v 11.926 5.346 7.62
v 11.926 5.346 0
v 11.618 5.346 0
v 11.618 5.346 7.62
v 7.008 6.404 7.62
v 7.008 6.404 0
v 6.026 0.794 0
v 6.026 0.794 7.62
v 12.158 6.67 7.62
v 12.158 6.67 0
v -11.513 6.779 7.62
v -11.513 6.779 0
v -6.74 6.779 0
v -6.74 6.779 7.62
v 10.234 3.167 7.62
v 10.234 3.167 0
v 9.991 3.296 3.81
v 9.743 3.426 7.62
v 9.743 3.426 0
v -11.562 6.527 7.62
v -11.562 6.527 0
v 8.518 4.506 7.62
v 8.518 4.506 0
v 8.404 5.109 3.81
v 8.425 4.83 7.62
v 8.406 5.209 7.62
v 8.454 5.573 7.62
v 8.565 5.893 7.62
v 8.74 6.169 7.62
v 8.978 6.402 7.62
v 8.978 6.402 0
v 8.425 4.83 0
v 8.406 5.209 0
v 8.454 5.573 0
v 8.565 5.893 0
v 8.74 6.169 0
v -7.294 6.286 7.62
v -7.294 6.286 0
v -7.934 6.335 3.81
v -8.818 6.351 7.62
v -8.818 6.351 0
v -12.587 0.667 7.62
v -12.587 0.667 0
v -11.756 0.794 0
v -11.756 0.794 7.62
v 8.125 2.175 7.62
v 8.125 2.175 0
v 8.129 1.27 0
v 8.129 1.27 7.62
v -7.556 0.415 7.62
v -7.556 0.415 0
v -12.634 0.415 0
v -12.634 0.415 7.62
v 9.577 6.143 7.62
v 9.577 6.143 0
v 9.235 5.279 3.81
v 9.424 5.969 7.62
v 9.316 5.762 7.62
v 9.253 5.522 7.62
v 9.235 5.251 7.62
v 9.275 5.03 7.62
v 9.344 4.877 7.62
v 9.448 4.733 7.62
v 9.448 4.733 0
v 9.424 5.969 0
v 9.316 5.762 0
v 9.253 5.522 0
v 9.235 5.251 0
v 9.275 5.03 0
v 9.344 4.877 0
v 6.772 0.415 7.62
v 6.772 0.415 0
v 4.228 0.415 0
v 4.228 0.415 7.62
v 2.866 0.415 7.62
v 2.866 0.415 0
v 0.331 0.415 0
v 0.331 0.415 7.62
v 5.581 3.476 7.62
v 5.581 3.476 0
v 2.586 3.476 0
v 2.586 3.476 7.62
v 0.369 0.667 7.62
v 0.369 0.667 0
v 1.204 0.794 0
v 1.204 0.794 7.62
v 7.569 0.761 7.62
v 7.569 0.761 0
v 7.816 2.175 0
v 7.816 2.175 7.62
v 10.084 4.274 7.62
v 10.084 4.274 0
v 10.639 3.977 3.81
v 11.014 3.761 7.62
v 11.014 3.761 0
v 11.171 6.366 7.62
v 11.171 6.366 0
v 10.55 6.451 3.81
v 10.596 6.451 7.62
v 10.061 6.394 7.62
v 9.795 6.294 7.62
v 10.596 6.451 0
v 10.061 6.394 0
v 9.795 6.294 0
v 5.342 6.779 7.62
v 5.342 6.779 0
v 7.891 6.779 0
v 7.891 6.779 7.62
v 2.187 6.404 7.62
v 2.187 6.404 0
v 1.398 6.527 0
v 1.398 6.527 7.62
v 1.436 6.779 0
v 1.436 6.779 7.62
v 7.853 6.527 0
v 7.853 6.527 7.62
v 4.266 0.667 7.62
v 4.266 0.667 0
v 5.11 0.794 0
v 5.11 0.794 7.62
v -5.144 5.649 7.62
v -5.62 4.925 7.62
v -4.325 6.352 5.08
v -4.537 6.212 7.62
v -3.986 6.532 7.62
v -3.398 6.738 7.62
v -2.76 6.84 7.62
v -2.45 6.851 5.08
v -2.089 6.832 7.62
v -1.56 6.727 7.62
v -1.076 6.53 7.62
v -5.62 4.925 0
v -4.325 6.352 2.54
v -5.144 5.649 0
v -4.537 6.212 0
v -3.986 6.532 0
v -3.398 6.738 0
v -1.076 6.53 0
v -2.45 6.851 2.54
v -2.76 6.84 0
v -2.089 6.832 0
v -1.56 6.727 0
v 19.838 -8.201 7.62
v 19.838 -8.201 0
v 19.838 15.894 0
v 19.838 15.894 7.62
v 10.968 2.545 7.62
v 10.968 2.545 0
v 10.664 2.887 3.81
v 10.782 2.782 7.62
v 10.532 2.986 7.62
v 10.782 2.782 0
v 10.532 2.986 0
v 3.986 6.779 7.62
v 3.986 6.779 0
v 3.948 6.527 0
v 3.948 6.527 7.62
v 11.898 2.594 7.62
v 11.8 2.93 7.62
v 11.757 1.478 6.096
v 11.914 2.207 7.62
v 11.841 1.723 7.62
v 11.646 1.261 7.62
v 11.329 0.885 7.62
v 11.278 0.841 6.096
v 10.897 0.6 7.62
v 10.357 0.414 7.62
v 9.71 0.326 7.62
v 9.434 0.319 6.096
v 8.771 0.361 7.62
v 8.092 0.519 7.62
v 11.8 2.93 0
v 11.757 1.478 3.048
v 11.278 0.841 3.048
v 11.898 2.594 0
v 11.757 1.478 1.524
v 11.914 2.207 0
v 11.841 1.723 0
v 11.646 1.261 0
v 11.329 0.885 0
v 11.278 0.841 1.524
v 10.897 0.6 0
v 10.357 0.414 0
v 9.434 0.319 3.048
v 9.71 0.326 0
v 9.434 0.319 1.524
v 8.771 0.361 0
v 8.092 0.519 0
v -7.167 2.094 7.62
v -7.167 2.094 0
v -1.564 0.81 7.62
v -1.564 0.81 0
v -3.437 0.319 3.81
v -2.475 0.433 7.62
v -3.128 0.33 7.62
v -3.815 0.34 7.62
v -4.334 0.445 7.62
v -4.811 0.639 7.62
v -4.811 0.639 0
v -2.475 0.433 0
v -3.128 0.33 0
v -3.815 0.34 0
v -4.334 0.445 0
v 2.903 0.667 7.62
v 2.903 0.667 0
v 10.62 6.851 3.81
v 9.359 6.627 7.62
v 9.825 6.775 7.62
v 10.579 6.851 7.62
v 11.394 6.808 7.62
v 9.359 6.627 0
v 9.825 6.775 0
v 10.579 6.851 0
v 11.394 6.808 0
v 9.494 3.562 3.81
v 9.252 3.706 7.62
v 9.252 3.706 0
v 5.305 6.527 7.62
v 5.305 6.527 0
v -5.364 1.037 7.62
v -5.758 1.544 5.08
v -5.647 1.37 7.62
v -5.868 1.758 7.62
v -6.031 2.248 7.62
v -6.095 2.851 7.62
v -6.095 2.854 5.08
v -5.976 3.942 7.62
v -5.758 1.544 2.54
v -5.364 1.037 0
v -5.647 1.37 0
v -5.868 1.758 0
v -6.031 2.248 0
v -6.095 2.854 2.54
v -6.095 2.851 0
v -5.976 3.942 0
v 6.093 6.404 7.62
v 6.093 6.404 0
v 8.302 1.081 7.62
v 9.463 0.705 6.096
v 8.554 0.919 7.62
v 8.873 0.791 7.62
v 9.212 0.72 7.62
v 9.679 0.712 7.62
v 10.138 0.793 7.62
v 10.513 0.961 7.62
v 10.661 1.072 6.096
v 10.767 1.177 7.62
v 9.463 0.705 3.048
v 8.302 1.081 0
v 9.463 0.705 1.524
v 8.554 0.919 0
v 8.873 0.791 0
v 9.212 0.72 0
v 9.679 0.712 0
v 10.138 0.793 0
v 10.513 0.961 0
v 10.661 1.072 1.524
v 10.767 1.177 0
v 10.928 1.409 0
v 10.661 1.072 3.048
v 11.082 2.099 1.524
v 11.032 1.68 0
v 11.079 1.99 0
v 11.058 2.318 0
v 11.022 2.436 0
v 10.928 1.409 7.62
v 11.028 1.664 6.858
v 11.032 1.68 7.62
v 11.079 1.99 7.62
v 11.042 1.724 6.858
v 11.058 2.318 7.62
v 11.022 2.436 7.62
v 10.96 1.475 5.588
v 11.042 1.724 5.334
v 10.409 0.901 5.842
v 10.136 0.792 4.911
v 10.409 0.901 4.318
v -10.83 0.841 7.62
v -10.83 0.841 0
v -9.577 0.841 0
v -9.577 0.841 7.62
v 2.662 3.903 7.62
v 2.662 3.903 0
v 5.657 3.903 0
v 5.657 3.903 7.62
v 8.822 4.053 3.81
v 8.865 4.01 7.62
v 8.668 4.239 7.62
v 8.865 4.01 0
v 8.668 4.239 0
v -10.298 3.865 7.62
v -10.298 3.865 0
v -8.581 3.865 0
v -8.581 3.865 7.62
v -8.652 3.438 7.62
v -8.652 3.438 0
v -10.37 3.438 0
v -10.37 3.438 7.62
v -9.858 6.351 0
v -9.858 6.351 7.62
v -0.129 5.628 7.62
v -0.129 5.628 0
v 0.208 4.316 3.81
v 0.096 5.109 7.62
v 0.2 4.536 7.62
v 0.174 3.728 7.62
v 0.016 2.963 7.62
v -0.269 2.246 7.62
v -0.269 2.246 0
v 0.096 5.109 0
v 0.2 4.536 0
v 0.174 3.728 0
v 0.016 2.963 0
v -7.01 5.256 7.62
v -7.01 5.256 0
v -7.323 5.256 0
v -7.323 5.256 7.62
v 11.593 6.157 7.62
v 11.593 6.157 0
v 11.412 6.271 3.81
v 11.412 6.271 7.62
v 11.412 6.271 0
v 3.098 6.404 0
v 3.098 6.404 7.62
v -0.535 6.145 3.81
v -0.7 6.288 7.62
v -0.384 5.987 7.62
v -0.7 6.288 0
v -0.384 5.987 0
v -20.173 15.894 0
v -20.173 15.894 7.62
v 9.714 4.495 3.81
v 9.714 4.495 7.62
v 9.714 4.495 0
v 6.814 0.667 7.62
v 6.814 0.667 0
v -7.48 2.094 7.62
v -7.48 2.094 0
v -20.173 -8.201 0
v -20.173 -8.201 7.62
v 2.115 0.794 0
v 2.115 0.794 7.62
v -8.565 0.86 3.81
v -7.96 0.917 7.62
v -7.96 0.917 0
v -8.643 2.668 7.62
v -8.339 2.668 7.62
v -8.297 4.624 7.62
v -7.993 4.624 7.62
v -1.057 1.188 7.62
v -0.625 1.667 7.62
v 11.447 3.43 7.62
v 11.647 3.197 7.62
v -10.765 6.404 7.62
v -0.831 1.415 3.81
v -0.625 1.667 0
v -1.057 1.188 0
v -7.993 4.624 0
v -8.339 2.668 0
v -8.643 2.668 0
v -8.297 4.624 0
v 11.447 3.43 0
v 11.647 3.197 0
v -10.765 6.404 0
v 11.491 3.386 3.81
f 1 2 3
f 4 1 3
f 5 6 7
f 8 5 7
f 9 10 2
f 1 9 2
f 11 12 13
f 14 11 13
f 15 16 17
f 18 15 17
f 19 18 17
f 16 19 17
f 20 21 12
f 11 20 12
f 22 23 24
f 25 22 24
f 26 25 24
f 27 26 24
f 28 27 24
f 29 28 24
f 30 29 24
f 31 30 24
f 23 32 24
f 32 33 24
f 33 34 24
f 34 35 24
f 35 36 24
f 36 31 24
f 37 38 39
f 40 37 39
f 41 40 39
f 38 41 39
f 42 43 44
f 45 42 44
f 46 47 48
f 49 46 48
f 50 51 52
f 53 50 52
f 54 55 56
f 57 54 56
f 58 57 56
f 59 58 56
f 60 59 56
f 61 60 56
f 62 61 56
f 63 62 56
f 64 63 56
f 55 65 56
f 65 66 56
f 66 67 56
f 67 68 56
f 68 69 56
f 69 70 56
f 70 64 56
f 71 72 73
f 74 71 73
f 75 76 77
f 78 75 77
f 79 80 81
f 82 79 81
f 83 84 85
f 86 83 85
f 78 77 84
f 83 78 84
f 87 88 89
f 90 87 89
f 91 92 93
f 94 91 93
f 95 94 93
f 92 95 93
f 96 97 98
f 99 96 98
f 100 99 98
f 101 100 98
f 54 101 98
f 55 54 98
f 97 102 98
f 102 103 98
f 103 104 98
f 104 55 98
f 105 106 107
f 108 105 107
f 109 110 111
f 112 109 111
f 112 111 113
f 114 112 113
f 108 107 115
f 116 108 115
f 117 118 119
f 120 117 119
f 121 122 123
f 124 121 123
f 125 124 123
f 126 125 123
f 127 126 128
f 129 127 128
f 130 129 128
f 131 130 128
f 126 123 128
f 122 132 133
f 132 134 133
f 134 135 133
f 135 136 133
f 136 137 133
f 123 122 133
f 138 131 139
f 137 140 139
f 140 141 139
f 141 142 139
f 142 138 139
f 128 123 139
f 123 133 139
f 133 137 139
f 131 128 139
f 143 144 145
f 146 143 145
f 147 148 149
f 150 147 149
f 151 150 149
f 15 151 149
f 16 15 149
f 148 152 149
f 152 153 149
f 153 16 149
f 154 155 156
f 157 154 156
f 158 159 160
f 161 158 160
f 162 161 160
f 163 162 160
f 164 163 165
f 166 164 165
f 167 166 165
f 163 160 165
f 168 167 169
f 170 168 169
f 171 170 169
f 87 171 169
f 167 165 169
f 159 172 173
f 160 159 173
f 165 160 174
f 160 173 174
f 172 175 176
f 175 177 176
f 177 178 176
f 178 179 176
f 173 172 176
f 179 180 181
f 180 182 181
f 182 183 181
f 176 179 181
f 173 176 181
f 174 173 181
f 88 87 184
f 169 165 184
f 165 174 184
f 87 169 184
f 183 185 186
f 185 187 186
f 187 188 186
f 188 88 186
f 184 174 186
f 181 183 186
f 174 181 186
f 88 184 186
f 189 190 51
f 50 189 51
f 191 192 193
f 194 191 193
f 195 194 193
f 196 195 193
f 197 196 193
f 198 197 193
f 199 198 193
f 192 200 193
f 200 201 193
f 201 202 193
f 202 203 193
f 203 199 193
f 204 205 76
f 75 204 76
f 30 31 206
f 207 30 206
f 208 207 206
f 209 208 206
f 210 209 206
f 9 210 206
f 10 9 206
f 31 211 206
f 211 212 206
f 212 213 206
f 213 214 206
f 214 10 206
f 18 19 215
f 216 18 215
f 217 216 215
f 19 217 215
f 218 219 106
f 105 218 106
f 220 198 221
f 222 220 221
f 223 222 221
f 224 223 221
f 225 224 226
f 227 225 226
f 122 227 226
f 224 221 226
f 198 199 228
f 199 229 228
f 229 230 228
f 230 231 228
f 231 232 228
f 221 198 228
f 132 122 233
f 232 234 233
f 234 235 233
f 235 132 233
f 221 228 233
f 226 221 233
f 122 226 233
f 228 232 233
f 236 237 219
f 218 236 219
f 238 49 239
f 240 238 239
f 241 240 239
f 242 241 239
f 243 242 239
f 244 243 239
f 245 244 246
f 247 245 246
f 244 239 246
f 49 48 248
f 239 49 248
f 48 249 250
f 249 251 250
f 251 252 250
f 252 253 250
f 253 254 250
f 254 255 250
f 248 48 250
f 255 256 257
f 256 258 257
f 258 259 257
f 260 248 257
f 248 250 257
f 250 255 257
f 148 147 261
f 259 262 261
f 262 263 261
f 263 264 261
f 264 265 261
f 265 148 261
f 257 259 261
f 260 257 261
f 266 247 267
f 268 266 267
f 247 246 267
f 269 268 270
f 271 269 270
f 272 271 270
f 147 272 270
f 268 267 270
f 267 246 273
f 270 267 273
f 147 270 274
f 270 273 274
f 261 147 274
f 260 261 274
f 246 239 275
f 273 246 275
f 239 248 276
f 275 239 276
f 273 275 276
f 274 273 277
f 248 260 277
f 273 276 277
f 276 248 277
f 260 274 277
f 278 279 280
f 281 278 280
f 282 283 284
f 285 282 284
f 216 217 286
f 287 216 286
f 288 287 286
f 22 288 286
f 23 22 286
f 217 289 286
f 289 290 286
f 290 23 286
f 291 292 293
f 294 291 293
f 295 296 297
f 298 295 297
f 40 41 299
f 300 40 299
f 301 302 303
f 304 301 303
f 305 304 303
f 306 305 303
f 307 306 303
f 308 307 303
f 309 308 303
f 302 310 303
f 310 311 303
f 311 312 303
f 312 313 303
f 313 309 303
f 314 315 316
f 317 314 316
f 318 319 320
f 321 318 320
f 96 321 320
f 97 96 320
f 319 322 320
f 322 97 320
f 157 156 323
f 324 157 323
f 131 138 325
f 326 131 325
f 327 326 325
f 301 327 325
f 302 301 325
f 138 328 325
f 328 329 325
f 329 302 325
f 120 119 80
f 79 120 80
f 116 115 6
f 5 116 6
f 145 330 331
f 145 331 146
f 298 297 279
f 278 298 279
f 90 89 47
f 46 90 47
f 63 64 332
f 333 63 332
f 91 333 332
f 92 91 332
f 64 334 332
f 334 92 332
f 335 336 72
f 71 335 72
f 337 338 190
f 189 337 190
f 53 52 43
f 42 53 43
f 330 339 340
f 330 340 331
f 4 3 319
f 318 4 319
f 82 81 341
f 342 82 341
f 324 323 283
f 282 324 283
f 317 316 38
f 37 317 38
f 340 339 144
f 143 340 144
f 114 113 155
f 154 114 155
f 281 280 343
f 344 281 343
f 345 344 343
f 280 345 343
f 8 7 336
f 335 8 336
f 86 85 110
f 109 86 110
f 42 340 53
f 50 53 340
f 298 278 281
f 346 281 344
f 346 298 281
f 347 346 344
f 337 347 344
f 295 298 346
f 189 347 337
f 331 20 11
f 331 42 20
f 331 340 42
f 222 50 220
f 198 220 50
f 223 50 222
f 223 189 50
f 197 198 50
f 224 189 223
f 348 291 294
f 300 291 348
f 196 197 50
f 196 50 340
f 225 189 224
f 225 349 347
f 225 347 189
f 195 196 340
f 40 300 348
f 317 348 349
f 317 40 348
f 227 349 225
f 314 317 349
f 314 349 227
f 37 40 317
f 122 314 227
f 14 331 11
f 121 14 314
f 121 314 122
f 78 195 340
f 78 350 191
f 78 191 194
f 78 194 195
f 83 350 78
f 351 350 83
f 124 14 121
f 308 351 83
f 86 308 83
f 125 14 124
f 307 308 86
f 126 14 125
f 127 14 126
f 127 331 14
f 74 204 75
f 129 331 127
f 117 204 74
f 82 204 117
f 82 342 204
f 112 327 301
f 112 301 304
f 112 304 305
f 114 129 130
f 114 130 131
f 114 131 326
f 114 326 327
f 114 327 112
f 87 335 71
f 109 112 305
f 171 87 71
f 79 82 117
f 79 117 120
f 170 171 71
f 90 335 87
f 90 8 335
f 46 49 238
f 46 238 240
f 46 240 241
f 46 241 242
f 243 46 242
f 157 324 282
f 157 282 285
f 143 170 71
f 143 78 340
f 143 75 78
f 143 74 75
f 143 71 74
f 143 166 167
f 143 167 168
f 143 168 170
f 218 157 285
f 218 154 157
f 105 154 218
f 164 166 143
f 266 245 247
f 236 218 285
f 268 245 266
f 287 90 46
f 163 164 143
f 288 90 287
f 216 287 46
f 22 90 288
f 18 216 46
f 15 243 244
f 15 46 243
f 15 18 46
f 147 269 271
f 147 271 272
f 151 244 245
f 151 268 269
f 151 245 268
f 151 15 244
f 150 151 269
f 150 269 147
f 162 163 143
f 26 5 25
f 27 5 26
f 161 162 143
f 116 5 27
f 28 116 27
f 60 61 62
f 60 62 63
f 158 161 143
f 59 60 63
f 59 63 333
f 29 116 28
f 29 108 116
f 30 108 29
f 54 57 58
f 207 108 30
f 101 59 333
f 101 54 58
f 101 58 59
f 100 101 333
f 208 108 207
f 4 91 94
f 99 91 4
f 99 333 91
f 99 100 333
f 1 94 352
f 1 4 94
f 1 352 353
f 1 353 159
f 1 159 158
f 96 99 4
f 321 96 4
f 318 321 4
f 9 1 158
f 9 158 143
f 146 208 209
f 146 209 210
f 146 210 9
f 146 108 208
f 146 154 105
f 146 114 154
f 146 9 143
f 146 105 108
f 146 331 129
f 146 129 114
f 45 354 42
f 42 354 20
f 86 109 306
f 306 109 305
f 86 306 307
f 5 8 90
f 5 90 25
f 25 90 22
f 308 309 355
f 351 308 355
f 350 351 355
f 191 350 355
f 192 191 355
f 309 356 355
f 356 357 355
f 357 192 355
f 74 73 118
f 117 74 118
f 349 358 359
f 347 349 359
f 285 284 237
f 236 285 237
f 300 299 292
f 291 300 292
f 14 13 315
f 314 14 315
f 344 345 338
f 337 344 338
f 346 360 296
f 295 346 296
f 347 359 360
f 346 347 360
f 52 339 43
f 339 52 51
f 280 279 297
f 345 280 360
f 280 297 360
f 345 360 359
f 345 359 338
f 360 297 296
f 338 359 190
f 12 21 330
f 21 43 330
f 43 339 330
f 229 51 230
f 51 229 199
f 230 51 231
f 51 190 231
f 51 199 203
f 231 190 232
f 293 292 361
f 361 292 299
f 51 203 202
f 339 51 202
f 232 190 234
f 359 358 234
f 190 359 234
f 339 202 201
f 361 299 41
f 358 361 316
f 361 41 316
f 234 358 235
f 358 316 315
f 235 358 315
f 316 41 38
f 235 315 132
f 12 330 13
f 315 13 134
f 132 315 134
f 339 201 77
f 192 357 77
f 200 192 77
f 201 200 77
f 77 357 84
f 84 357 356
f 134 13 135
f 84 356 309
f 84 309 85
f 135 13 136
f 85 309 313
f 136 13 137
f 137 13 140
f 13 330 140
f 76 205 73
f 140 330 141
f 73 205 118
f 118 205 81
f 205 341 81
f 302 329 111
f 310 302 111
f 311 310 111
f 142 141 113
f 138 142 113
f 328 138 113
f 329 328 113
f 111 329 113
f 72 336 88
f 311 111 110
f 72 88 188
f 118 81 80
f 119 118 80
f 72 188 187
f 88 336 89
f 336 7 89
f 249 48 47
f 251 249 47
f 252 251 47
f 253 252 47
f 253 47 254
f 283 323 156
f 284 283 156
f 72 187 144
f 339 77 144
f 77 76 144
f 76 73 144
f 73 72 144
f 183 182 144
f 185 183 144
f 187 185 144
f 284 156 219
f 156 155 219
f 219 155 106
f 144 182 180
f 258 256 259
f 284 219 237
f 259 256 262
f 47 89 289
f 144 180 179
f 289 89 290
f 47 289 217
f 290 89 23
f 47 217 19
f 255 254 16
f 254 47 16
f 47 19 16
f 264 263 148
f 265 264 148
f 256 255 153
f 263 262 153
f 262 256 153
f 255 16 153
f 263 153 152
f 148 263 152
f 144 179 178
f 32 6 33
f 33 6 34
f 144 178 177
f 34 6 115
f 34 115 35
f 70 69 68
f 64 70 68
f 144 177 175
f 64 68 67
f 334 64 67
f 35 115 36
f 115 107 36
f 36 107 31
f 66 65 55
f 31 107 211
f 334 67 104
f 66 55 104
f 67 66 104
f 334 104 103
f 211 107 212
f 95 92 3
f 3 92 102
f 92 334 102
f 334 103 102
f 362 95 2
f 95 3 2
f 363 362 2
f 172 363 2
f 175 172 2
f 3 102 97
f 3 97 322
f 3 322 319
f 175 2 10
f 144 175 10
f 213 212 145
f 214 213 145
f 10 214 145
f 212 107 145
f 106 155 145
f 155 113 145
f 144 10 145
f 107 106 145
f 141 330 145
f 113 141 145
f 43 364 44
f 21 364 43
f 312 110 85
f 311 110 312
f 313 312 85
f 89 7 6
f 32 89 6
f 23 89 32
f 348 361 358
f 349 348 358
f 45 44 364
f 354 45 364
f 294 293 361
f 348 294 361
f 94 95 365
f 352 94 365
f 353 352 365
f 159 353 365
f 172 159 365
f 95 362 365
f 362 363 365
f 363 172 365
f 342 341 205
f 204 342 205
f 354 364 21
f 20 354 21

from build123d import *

# Parameters (mm, degrees)
F0_W     = 40.0103181601
F0_H     = 24.0946123376
F1_DEPTH = 7.62


with BuildPart() as f1:
    # F0 (on Top) → F1 (new body)
    with BuildSketch(Plane.XY):
        with Locations((-0.1676287502, 3.8467827253)):
            Rectangle(F0_W, F0_H)
        with BuildLine():
            Line((-11.7563733071, 0.7942912366), (-10.7646722607, 6.4043121633))
            Line((-10.7646722607, 6.4043121633), (-11.5619816778, 6.5273256163))
            Line((-11.5619816778, 6.5273256163), (-11.5133837704, 6.7794272605))
            Line((-11.5133837704, 6.7794272605), (-6.7401580604, 6.7794272605))
            Line((-6.7401580604, 6.7794272605), (-7.0104839199, 5.2561866028))
            Line((-7.0104839199, 5.2561866028), (-7.3233329483, 5.2561866028))
            Line((-7.3233329483, 5.2561866028), (-7.2944779408, 6.2858547642))
            add(Edge.make_bspline(
                [(-7.2944779408, 6.2858547642), (-7.8123493908, 6.3511582022), (-8.8177185985, 6.3511582022)],
                knots=[0, 0, 0, 1, 1, 1], degree=2))
            Line((-8.8177185985, 6.3511582022), (-9.8580175522, 6.3511582022))
            Line((-9.8580175522, 6.3511582022), (-10.2984360873, 3.8650715056))
            Line((-10.2984360873, 3.8650715056), (-8.5808038003, 3.8650715056))
            Line((-8.5808038003, 3.8650715056), (-8.2968097794, 4.6244138076))
            Line((-8.2968097794, 4.6244138076), (-7.9930728586, 4.6244138076))
            Line((-7.9930728586, 4.6244138076), (-8.3393329483, 2.6683480378))
            Line((-8.3393329483, 2.6683480378), (-8.6430698691, 2.6683480378))
            Line((-8.6430698691, 2.6683480378), (-8.6521819767, 3.4383211319))
            Line((-8.6521819767, 3.4383211319), (-10.3698142637, 3.4383211319))
            Line((-10.3698142637, 3.4383211319), (-10.8299756987, 0.8413704593))
            Line((-10.8299756987, 0.8413704593), (-9.5770609005, 0.8413704593))
            add(Edge.make_bspline(
                [(-9.5770609005, 0.8413704593), (-8.3621132174, 0.8413704593), (-7.9596617973, 0.9173046895)],
                knots=[0, 0, 0, 1, 1, 1], degree=2))
            Line((-7.9596617973, 0.9173046895), (-7.4797574625, 2.0942852575))
            Line((-7.4797574625, 2.0942852575), (-7.1669084341, 2.0942852575))
            Line((-7.1669084341, 2.0942852575), (-7.5556916927, 0.4146200856))
            Line((-7.5556916927, 0.4146200856), (-12.6341730081, 0.4146200856))
            Line((-12.6341730081, 0.4146200856), (-12.5870937854, 0.6667217299))
            Line((-12.5870937854, 0.6667217299), (-11.7563733071, 0.7942912366))
        make_face(mode=Mode.SUBTRACT)
        with BuildLine():
            add(Edge.make_bspline(
                [(-1.5644809304, 0.8102374249), (-2.3830519319, 0.3189429556), (-3.437019047, 0.3189429556)],
                knots=[0, 0, 0, 1, 1, 1], degree=2))
            add(Edge.make_bspline(
                [(-3.437019047, 0.3189429556), (-4.2009174027, 0.3189429556), (-4.8106692712, 0.639385407)],
                knots=[0, 0, 0, 1, 1, 1], degree=2))
            add(Edge.make_bspline(
                [(-4.8106692712, 0.639385407), (-5.4204211396, 0.9598278584), (-5.7575691217, 1.5437620886)],
                knots=[0, 0, 0, 1, 1, 1], degree=2))
            add(Edge.make_bspline(
                [(-5.7575691217, 1.5437620886), (-6.0947171038, 2.1276963188), (-6.0947171038, 2.8536275595)],
                knots=[0, 0, 0, 1, 1, 1], degree=2))
            add(Edge.make_bspline(
                [(-6.0947171038, 2.8536275595), (-6.0947171038, 3.9971970662), (-5.6201281651, 4.9251133592)],
                knots=[0, 0, 0, 1, 1, 1], degree=2))
            add(Edge.make_bspline(
                [(-5.6201281651, 4.9251133592), (-5.1455392263, 5.8530296521), (-4.3246901979, 6.3519175445)],
                knots=[0, 0, 0, 1, 1, 1], degree=2))
            add(Edge.make_bspline(
                [(-4.3246901979, 6.3519175445), (-3.5038411695, 6.8508054369), (-2.4498740544, 6.8508054369)],
                knots=[0, 0, 0, 1, 1, 1], degree=2))
            add(Edge.make_bspline(
                [(-2.4498740544, 6.8508054369), (-1.6859756987, 6.8508054369), (-1.0762238302, 6.5303629855)],
                knots=[0, 0, 0, 1, 1, 1], degree=2))
            add(Edge.make_bspline(
                [(-1.0762238302, 6.5303629855), (-0.4664719618, 6.209920534), (-0.1293239797, 5.6282643308)],
                knots=[0, 0, 0, 1, 1, 1], degree=2))
            add(Edge.make_bspline(
                [(-0.1293239797, 5.6282643308), (0.2078240024, 5.0466081275), (0.2078240024, 4.316120833)],
                knots=[0, 0, 0, 1, 1, 1], degree=2))
            add(Edge.make_bspline(
                [(0.2078240024, 4.316120833), (0.2078240024, 3.1907755415), (-0.2690429633, 2.2461537179)],
                knots=[0, 0, 0, 1, 1, 1], degree=2))
            add(Edge.make_bspline(
                [(-0.2690429633, 2.2461537179), (-0.7459099289, 1.3015318943), (-1.5644809304, 0.8102374249)],
                knots=[0, 0, 0, 1, 1, 1], degree=2))
        make_face(mode=Mode.SUBTRACT)
        Polygon((2.8655220592, 0.4146200856), (0.3308374553, 0.4146200856), (0.3688045704, 0.6667217299), (1.2040811025, 0.7942912366), (2.1866700412, 6.4043121633), (1.3984727318, 6.5273256163), (1.4364398469, 6.7794272605), (3.9863112968, 6.7794272605), (3.9483441817, 6.5273256163), (3.0978808036, 6.4043121633), (2.6620183222, 3.9030386207), (5.6568643611, 3.9030386207), (6.0927268424, 6.4043121633), (5.304529533, 6.5273256163), (5.3424966481, 6.7794272605), (7.8908494134, 6.7794272605), (7.8528822983, 6.5273256163), (7.0084936586, 6.4043121633), (6.0259047199, 0.7942912366), (6.8141020293, 0.6667217299), (6.7715788604, 0.4146200856), (4.2277821488, 0.4146200856), (4.2657492639, 0.6667217299), (5.1101379037, 0.7942912366), (5.5809301309, 3.476288247), (2.586084092, 3.476288247), (2.1152918648, 0.7942912366), (2.9034891743, 0.6667217299), align=None, mode=Mode.SUBTRACT)
        with BuildLine():
            Line((7.5688882774, 0.7608801753), (7.8164338678, 2.1747755415))
            Line((7.8164338678, 2.1747755415), (8.1247268424, 2.1747755415))
            Line((8.1247268424, 2.1747755415), (8.1292828962, 1.2696395176))
            add(Edge.make_bspline(
                [(8.1292828962, 1.2696395176), (8.2857074104, 1.0312060348), (8.6631005345, 0.8679474399)],
                knots=[0, 0, 0, 1, 1, 1], degree=2))
            add(Edge.make_bspline(
                [(8.6631005345, 0.8679474399), (9.0404936586, 0.704688845), (9.4626879784, 0.704688845)],
                knots=[0, 0, 0, 1, 1, 1], degree=2))
            add(Edge.make_bspline(
                [(9.4626879784, 0.704688845), (10.2402544956, 0.704688845), (10.6609301309, 1.0722105191)],
                knots=[0, 0, 0, 1, 1, 1], degree=2))
            add(Edge.make_bspline(
                [(10.6609301309, 1.0722105191), (11.0816057662, 1.4397321932), (11.0816057662, 2.0988413113)],
                knots=[0, 0, 0, 1, 1, 1], degree=2))
            add(Edge.make_bspline(
                [(11.0816057662, 2.0988413113), (11.0816057662, 2.3554990094), (10.9677044209, 2.5453345849)],
                knots=[0, 0, 0, 1, 1, 1], degree=2))
            add(Edge.make_bspline(
                [(10.9677044209, 2.5453345849), (10.8538030756, 2.7351701603), (10.6639675001, 2.8870386207)],
                knots=[0, 0, 0, 1, 1, 1], degree=2))
            add(Edge.make_bspline(
                [(10.6639675001, 2.8870386207), (10.4741319246, 3.0389070811), (10.2341797572, 3.1672359302)],
                knots=[0, 0, 0, 1, 1, 1], degree=2))
            add(Edge.make_bspline(
                [(10.2341797572, 3.1672359302), (9.9942275898, 3.2955647792), (9.7428852879, 3.4261716551)],
                knots=[0, 0, 0, 1, 1, 1], degree=2))
            add(Edge.make_bspline(
                [(9.7428852879, 3.4261716551), (9.4915429859, 3.5567785311), (9.2515908185, 3.7063689645)],
                knots=[0, 0, 0, 1, 1, 1], degree=2))
            add(Edge.make_bspline(
                [(9.2515908185, 3.7063689645), (9.0116386511, 3.855959398), (8.8218030756, 4.0526290542)],
                knots=[0, 0, 0, 1, 1, 1], degree=2))
            add(Edge.make_bspline(
                [(8.8218030756, 4.0526290542), (8.6319675001, 4.2492987104), (8.5180661548, 4.5059564085)],
                knots=[0, 0, 0, 1, 1, 1], degree=2))
            add(Edge.make_bspline(
                [(8.5180661548, 4.5059564085), (8.4041648095, 4.7626141065), (8.4041648095, 5.1088741962)],
                knots=[0, 0, 0, 1, 1, 1], degree=2))
            add(Edge.make_bspline(
                [(8.4041648095, 5.1088741962), (8.4041648095, 5.953262836), (8.9782275898, 6.4020341364)],
                knots=[0, 0, 0, 1, 1, 1], degree=2))
            add(Edge.make_bspline(
                [(8.9782275898, 6.4020341364), (9.5522903701, 6.8508054369), (10.6199256466, 6.8508054369)],
                knots=[0, 0, 0, 1, 1, 1], degree=2))
            add(Edge.make_bspline(
                [(10.6199256466, 6.8508054369), (11.4369779635, 6.8508054369), (12.1583531503, 6.670081969)],
                knots=[0, 0, 0, 1, 1, 1], degree=2))
            Line((12.1583531503, 6.670081969), (11.9259944059, 5.3457889944))
            Line((11.9259944059, 5.3457889944), (11.6177014314, 5.3457889944))
            Line((11.6177014314, 5.3457889944), (11.5934024777, 6.1567665729))
            add(Edge.make_bspline(
                [(11.5934024777, 6.1567665729), (11.4415340173, 6.2812987104), (11.1712081578, 6.3663450482)],
                knots=[0, 0, 0, 1, 1, 1], degree=2))
            add(Edge.make_bspline(
                [(11.1712081578, 6.3663450482), (10.9008822983, 6.4513913861), (10.5500661548, 6.4513913861)],
                knots=[0, 0, 0, 1, 1, 1], degree=2))
            add(Edge.make_bspline(
                [(10.5500661548, 6.4513913861), (9.9182933596, 6.4513913861), (9.5765893237, 6.1430984115)],
                knots=[0, 0, 0, 1, 1, 1], degree=2))
            add(Edge.make_bspline(
                [(9.5765893237, 6.1430984115), (9.2348852879, 5.8348054369), (9.2348852879, 5.2789668719)],
                knots=[0, 0, 0, 1, 1, 1], degree=2))
            add(Edge.make_bspline(
                [(9.2348852879, 5.2789668719), (9.2348852879, 4.9797860049), (9.4482604747, 4.7329997568)],
                knots=[0, 0, 0, 1, 1, 1], degree=2))
            add(Edge.make_bspline(
                [(9.4482604747, 4.7329997568), (9.6616356616, 4.4862135086), (10.0838299814, 4.2735976641)],
                knots=[0, 0, 0, 1, 1, 1], degree=2))
            add(Edge.make_bspline(
                [(10.0838299814, 4.2735976641), (10.7292709381, 3.936449682), (11.0140243013, 3.7610416103)],
                knots=[0, 0, 0, 1, 1, 1], degree=2))
            add(Edge.make_bspline(
                [(11.0140243013, 3.7610416103), (11.2987776645, 3.5856335385), (11.4908912669, 3.3859265131)],
                knots=[0, 0, 0, 1, 1, 1], degree=2))
            add(Edge.make_bspline(
                [(11.4908912669, 3.3859265131), (11.6830048693, 3.1862194877), (11.7999435838, 2.9303211319)],
                knots=[0, 0, 0, 1, 1, 1], degree=2))
            add(Edge.make_bspline(
                [(11.7999435838, 2.9303211319), (11.9168822983, 2.6744227762), (11.9168822983, 2.3418308479)],
                knots=[0, 0, 0, 1, 1, 1], degree=2))
            add(Edge.make_bspline(
                [(11.9168822983, 2.3418308479), (11.9168822983, 1.363797963), (11.2782754224, 0.8413704593)],
                knots=[0, 0, 0, 1, 1, 1], degree=2))
            add(Edge.make_bspline(
                [(11.2782754224, 0.8413704593), (10.6396685465, 0.3189429556), (9.433832971, 0.3189429556)],
                knots=[0, 0, 0, 1, 1, 1], degree=2))
            add(Edge.make_bspline(
                [(9.433832971, 0.3189429556), (8.835471237, 0.3189429556), (8.3586042714, 0.4404377239)],
                knots=[0, 0, 0, 1, 1, 1], degree=2))
            add(Edge.make_bspline(
                [(8.3586042714, 0.4404377239), (7.8817373058, 0.5619324922), (7.5688882774, 0.7608801753)],
                knots=[0, 0, 0, 1, 1, 1], degree=2))
        make_face(mode=Mode.SUBTRACT)
    extrude(amount=F1_DEPTH)


solid = f1.part
